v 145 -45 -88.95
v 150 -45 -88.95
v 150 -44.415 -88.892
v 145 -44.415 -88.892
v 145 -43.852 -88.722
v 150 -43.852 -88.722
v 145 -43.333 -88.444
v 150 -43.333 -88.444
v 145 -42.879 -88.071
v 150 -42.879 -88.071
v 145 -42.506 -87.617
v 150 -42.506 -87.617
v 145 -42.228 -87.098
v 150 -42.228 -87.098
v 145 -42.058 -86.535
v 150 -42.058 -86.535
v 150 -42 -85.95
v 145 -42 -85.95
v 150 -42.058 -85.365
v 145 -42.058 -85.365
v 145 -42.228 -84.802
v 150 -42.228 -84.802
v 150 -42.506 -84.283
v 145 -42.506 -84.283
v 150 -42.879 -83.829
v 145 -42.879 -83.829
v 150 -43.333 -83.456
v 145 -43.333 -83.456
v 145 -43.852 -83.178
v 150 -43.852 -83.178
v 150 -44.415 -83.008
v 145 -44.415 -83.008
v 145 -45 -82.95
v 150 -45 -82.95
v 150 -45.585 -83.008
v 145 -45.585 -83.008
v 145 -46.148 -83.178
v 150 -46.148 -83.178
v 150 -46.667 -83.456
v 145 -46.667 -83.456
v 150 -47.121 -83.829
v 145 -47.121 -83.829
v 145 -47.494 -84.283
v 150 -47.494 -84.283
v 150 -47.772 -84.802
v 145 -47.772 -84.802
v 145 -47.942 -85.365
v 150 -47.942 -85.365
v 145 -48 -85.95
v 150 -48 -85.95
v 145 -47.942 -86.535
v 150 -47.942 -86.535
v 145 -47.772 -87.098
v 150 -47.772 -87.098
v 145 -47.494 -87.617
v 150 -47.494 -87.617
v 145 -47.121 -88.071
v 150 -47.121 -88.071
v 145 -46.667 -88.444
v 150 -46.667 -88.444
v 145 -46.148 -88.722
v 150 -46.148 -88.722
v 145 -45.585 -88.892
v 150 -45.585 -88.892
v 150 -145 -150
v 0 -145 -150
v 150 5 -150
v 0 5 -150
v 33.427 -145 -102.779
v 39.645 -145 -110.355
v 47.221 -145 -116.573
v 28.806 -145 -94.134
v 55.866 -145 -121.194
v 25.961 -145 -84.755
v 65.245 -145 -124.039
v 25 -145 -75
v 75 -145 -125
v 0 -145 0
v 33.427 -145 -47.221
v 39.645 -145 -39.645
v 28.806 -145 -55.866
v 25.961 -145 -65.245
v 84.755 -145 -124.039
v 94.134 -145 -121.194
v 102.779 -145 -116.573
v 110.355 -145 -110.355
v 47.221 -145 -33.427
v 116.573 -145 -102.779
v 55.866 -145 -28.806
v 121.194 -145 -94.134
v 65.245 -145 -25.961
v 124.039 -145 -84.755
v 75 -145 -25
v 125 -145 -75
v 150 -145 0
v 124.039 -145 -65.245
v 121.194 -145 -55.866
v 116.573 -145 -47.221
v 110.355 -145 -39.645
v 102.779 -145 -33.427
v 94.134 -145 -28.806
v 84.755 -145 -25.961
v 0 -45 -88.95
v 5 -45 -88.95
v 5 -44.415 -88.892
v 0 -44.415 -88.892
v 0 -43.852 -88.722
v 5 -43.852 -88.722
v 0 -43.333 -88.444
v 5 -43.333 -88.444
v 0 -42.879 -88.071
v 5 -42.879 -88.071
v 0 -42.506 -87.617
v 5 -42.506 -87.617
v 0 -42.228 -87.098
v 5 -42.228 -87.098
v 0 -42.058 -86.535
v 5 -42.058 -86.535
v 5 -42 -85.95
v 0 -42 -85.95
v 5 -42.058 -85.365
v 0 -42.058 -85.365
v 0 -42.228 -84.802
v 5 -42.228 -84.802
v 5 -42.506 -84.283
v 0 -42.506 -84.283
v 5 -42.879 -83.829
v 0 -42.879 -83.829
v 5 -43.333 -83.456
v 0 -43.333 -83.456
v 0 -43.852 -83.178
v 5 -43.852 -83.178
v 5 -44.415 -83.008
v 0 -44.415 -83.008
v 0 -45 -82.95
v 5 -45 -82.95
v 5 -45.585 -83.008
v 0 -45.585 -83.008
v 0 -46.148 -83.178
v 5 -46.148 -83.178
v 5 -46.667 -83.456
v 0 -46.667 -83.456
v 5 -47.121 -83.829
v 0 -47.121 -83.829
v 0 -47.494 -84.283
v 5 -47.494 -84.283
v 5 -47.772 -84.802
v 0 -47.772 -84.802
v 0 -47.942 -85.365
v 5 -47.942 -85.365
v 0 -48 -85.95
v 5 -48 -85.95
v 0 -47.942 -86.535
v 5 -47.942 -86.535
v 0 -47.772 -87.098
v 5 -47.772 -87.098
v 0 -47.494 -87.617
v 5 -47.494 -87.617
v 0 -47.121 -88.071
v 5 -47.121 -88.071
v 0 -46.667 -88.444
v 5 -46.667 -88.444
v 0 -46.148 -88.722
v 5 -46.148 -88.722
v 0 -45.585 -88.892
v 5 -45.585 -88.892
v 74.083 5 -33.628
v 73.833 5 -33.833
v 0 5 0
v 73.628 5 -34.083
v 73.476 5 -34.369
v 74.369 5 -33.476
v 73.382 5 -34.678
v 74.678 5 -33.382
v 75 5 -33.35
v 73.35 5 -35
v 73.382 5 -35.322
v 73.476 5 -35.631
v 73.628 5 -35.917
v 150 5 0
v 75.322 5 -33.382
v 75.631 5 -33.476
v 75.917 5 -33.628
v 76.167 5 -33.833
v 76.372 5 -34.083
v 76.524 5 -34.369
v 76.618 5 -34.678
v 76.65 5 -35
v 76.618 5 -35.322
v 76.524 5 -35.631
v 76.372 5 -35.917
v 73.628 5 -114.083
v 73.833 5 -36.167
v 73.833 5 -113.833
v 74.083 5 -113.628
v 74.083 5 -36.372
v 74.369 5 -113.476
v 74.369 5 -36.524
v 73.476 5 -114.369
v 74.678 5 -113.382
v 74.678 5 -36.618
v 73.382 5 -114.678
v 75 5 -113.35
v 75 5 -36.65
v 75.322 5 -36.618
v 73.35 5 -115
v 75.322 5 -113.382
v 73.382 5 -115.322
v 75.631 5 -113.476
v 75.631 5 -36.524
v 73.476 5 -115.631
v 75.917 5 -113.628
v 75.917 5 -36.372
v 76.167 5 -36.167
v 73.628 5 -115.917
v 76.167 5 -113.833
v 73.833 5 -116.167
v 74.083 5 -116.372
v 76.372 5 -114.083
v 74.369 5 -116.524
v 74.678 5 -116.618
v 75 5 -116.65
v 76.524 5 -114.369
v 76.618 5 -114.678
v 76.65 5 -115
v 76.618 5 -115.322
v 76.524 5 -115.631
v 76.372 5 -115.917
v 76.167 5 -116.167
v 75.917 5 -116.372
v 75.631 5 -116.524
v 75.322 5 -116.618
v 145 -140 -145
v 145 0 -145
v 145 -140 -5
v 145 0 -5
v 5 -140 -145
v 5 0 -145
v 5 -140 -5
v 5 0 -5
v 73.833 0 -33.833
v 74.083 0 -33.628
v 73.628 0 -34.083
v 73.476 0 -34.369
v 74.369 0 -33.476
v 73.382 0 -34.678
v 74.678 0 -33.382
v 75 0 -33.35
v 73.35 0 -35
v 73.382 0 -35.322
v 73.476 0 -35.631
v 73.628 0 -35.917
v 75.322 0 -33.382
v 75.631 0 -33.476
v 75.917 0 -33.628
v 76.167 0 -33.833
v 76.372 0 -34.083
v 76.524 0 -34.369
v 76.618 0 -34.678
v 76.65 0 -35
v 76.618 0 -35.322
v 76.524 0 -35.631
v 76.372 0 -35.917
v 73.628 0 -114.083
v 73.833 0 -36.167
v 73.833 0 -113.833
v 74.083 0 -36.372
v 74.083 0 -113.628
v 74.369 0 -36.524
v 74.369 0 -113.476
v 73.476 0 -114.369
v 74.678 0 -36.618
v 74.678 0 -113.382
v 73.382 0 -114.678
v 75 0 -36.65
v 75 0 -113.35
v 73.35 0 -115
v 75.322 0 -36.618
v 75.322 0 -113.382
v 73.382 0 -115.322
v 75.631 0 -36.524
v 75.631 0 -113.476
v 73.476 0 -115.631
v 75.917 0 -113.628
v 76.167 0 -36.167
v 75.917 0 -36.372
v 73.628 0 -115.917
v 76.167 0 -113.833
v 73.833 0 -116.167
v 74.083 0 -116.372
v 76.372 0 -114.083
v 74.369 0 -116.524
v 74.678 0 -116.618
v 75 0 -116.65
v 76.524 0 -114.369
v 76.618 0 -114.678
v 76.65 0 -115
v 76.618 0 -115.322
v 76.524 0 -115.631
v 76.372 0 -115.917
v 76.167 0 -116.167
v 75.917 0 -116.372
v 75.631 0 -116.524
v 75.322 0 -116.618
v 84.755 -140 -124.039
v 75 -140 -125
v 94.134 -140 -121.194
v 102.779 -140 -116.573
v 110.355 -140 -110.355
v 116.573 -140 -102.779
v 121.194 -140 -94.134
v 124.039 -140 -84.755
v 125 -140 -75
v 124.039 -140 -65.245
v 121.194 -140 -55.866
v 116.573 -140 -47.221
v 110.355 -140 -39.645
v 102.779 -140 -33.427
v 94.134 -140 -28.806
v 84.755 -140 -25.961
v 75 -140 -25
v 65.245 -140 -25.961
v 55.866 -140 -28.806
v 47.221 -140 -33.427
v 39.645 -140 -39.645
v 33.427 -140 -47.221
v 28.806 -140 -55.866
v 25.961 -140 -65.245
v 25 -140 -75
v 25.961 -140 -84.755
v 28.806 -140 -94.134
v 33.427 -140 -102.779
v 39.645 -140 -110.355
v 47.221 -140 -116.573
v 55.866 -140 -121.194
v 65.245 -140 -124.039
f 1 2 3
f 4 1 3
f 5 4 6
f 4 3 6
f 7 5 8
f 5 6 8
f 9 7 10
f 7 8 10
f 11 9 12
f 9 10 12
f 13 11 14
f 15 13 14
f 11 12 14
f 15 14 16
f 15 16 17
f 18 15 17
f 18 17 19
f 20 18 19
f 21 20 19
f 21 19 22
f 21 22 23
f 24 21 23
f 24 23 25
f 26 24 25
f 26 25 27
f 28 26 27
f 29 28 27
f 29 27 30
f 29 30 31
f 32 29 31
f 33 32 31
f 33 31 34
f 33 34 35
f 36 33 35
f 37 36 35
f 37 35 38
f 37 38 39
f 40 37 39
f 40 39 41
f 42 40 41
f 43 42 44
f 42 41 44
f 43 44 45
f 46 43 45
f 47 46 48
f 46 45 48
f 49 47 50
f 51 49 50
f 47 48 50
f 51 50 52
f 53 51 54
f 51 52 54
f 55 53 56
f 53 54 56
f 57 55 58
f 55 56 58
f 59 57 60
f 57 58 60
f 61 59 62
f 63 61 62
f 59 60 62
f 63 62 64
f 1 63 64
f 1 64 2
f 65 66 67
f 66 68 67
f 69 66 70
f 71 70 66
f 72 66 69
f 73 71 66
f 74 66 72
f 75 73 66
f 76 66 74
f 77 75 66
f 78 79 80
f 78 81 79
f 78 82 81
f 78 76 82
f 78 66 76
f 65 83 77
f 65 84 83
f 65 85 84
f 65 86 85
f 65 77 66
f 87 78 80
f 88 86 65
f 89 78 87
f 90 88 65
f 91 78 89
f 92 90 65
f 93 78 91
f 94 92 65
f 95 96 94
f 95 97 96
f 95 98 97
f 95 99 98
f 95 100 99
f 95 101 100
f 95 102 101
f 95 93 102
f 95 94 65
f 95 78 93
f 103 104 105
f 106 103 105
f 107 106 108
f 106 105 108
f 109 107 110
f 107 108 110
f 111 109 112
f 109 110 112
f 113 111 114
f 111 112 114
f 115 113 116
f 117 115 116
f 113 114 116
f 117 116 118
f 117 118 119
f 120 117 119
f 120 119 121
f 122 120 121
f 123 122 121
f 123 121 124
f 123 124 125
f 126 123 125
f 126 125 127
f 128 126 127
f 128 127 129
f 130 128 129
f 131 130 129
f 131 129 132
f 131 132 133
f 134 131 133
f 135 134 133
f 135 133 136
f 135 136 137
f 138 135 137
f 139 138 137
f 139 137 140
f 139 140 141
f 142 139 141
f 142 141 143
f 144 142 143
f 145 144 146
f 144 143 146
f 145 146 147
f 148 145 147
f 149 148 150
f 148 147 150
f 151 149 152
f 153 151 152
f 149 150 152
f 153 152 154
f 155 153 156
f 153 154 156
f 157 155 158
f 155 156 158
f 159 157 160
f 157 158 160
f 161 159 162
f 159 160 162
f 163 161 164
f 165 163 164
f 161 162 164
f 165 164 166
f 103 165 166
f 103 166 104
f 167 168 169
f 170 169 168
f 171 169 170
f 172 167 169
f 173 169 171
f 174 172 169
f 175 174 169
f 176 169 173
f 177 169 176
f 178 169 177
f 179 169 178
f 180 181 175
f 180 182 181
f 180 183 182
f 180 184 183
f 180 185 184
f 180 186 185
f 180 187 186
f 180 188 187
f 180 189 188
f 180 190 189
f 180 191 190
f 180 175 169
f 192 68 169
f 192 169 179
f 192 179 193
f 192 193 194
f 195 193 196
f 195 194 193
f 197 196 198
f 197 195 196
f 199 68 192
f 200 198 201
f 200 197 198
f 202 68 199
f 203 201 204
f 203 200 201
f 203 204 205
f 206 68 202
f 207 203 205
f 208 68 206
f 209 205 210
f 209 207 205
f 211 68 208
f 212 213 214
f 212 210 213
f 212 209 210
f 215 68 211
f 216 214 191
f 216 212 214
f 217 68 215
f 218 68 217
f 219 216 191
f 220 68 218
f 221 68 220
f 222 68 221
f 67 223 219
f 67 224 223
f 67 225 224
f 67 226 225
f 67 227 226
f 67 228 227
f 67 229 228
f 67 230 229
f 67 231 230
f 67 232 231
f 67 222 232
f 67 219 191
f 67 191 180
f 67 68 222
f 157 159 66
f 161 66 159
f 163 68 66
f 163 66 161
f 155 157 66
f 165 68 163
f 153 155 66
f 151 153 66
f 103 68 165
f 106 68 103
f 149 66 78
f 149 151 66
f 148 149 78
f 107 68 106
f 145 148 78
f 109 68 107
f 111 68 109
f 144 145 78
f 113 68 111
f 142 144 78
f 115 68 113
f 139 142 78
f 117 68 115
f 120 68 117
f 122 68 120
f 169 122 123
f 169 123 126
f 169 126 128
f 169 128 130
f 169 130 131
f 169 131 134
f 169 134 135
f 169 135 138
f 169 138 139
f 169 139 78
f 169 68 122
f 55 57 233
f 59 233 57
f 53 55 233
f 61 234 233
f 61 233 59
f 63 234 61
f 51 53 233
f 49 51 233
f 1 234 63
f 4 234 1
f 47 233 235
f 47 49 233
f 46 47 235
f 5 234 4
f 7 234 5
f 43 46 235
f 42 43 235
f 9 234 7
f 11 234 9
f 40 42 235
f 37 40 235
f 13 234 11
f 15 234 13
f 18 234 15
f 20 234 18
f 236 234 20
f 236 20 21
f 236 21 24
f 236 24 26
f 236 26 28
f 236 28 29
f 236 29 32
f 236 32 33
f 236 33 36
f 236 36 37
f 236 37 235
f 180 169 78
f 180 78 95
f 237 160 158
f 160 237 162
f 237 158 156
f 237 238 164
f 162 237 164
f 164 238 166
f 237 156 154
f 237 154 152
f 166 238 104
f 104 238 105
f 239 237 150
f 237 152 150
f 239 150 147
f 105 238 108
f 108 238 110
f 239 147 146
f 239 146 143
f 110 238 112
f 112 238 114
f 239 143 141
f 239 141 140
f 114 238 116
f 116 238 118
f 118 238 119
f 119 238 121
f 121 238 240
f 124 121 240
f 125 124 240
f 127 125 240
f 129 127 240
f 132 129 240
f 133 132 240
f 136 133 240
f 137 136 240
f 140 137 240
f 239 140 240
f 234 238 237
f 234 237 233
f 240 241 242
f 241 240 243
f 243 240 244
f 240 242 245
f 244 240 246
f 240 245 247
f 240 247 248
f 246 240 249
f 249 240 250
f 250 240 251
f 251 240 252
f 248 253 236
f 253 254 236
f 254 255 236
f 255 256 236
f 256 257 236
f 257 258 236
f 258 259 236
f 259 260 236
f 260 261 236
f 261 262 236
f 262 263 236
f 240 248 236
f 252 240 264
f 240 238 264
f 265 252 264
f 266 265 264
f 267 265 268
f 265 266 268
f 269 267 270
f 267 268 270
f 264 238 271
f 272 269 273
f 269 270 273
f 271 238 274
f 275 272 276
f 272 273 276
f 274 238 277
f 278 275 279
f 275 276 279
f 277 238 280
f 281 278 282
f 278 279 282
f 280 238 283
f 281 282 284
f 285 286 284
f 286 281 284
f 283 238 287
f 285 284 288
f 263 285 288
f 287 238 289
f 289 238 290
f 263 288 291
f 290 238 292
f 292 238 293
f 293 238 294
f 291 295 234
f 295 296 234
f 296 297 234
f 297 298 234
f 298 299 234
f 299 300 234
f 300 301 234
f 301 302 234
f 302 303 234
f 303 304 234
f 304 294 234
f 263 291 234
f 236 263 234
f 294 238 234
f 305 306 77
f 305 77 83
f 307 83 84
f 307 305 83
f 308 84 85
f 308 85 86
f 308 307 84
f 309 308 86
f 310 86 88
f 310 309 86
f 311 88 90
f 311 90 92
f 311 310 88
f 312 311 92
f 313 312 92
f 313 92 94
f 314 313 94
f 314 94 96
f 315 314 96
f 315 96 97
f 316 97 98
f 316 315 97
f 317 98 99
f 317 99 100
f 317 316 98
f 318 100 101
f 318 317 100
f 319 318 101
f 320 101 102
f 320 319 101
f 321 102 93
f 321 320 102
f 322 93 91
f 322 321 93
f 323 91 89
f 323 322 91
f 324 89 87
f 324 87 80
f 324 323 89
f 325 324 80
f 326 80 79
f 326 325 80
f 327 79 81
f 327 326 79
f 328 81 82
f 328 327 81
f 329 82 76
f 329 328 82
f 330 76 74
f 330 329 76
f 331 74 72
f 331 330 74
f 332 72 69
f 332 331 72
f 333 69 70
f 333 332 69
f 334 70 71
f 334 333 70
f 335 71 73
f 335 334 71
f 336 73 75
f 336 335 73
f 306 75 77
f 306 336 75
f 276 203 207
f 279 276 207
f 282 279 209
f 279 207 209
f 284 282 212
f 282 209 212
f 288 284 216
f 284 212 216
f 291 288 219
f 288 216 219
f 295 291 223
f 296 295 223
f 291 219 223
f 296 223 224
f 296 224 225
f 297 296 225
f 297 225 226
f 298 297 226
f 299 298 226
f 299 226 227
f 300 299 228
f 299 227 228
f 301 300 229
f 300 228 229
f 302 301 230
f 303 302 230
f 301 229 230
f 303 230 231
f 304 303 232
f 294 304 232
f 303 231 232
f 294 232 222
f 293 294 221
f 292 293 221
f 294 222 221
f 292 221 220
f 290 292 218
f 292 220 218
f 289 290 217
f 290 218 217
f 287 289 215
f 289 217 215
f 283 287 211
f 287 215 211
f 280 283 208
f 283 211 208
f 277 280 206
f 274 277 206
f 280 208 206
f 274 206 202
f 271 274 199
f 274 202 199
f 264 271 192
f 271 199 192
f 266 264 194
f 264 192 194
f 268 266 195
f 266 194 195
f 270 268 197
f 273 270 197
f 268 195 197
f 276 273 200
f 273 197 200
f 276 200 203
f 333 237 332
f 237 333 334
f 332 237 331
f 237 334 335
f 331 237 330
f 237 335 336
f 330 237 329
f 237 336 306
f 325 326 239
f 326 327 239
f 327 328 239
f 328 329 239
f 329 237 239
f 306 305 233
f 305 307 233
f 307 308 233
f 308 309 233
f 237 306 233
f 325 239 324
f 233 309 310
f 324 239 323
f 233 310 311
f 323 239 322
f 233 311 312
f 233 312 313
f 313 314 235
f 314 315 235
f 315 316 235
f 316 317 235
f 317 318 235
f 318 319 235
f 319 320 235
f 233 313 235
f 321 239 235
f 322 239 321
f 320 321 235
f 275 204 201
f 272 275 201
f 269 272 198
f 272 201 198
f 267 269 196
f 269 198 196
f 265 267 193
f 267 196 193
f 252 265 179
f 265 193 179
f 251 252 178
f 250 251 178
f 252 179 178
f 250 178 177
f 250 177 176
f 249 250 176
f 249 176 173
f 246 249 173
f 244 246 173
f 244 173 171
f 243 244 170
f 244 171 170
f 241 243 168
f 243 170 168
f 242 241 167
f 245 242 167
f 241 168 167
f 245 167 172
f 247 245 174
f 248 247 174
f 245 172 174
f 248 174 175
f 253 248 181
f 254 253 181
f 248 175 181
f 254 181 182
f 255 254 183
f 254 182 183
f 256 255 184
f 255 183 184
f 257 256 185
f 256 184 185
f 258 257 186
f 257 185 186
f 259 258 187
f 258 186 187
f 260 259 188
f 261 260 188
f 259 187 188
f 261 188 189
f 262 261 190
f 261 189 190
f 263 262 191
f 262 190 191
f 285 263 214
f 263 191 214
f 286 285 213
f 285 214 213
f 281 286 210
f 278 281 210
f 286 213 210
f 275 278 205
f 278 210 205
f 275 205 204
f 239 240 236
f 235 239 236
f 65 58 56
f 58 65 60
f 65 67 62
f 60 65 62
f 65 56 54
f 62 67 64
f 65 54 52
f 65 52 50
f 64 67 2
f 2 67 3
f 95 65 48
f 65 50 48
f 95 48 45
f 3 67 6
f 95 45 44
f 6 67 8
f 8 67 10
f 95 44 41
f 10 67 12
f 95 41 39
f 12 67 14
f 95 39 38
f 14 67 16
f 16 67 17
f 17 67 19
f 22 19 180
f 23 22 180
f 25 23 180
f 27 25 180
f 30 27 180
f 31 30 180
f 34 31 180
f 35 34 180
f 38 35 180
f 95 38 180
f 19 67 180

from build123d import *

# Parameters (mm, degrees)
SKETCH_1_W          = 150
SKETCH_1_H          = 150
EXTRUDE_1_DEPTH     = 5
SKETCH_3_W          = 150
SKETCH_3_H          = 150
SKETCH_3_W_2        = 140
SKETCH_3_H_2        = 140
EXTRUDE_2_DEPTH     = 140
SKETCH_5_R          = 1.65
CUT_EXTRUDE_1_DEPTH = 5
SKETCH_8_W          = 150
SKETCH_8_H          = 150
SKETCH_8_R          = 50
EXTRUDE_3_DEPTH     = 5
SKETCH_7_R          = 3
CUT_EXTRUDE_2_DEPTH = 257.953303151


with BuildPart() as part:
    # 草图1 → 凸台-拉伸1 (new body)
    with BuildSketch(Plane(origin=(0, 0, 0), x_dir=(1, 0, 0), z_dir=(0, 1, 0))):
        with Locations((75, 75)):
            Rectangle(SKETCH_1_W, SKETCH_1_H)
    extrude(amount=EXTRUDE_1_DEPTH)

    # 草图3 → 凸台-拉伸2 (add)
    with BuildSketch(Plane.XZ):
        with Locations((75, -75)):
            Rectangle(SKETCH_3_W, SKETCH_3_H)
        with Locations((75, -75)):
            Rectangle(SKETCH_3_W_2, SKETCH_3_H_2, mode=Mode.SUBTRACT)
    extrude(amount=EXTRUDE_2_DEPTH)

    # 草图5 → 切除-拉伸1 (cut)
    with BuildSketch(Plane(origin=(0, 5, 0), x_dir=(1, 0, 0), z_dir=(0, 1, 0))):
        with Locations(Location((75, 115, 0), (0, 0, 270))):
            Circle(SKETCH_5_R)
        with Locations(Location((75, 35, 0), (0, 0, 90))):
            Circle(SKETCH_5_R)
    extrude(amount=-CUT_EXTRUDE_1_DEPTH, mode=Mode.SUBTRACT)

    # 草图8 → 凸台-拉伸3 (add)
    with BuildSketch(Plane.XZ.offset(140)):
        with Locations((75, -75)):
            Rectangle(SKETCH_8_W, SKETCH_8_H)
        with Locations(Location((75, -75, 0), (0, 0, 270))):
            Circle(SKETCH_8_R, mode=Mode.SUBTRACT)
    extrude(amount=EXTRUDE_3_DEPTH)

    # 草图7 → 切除-拉伸2 (cut, through all)
    with BuildSketch(Plane(origin=(150, 0, 0), x_dir=(0, 0, -1), z_dir=(1, 0, 0))):
        with Locations((85.95, -45)):
            Circle(SKETCH_7_R)
    extrude(amount=-CUT_EXTRUDE_2_DEPTH, mode=Mode.SUBTRACT)


solid = part.part
